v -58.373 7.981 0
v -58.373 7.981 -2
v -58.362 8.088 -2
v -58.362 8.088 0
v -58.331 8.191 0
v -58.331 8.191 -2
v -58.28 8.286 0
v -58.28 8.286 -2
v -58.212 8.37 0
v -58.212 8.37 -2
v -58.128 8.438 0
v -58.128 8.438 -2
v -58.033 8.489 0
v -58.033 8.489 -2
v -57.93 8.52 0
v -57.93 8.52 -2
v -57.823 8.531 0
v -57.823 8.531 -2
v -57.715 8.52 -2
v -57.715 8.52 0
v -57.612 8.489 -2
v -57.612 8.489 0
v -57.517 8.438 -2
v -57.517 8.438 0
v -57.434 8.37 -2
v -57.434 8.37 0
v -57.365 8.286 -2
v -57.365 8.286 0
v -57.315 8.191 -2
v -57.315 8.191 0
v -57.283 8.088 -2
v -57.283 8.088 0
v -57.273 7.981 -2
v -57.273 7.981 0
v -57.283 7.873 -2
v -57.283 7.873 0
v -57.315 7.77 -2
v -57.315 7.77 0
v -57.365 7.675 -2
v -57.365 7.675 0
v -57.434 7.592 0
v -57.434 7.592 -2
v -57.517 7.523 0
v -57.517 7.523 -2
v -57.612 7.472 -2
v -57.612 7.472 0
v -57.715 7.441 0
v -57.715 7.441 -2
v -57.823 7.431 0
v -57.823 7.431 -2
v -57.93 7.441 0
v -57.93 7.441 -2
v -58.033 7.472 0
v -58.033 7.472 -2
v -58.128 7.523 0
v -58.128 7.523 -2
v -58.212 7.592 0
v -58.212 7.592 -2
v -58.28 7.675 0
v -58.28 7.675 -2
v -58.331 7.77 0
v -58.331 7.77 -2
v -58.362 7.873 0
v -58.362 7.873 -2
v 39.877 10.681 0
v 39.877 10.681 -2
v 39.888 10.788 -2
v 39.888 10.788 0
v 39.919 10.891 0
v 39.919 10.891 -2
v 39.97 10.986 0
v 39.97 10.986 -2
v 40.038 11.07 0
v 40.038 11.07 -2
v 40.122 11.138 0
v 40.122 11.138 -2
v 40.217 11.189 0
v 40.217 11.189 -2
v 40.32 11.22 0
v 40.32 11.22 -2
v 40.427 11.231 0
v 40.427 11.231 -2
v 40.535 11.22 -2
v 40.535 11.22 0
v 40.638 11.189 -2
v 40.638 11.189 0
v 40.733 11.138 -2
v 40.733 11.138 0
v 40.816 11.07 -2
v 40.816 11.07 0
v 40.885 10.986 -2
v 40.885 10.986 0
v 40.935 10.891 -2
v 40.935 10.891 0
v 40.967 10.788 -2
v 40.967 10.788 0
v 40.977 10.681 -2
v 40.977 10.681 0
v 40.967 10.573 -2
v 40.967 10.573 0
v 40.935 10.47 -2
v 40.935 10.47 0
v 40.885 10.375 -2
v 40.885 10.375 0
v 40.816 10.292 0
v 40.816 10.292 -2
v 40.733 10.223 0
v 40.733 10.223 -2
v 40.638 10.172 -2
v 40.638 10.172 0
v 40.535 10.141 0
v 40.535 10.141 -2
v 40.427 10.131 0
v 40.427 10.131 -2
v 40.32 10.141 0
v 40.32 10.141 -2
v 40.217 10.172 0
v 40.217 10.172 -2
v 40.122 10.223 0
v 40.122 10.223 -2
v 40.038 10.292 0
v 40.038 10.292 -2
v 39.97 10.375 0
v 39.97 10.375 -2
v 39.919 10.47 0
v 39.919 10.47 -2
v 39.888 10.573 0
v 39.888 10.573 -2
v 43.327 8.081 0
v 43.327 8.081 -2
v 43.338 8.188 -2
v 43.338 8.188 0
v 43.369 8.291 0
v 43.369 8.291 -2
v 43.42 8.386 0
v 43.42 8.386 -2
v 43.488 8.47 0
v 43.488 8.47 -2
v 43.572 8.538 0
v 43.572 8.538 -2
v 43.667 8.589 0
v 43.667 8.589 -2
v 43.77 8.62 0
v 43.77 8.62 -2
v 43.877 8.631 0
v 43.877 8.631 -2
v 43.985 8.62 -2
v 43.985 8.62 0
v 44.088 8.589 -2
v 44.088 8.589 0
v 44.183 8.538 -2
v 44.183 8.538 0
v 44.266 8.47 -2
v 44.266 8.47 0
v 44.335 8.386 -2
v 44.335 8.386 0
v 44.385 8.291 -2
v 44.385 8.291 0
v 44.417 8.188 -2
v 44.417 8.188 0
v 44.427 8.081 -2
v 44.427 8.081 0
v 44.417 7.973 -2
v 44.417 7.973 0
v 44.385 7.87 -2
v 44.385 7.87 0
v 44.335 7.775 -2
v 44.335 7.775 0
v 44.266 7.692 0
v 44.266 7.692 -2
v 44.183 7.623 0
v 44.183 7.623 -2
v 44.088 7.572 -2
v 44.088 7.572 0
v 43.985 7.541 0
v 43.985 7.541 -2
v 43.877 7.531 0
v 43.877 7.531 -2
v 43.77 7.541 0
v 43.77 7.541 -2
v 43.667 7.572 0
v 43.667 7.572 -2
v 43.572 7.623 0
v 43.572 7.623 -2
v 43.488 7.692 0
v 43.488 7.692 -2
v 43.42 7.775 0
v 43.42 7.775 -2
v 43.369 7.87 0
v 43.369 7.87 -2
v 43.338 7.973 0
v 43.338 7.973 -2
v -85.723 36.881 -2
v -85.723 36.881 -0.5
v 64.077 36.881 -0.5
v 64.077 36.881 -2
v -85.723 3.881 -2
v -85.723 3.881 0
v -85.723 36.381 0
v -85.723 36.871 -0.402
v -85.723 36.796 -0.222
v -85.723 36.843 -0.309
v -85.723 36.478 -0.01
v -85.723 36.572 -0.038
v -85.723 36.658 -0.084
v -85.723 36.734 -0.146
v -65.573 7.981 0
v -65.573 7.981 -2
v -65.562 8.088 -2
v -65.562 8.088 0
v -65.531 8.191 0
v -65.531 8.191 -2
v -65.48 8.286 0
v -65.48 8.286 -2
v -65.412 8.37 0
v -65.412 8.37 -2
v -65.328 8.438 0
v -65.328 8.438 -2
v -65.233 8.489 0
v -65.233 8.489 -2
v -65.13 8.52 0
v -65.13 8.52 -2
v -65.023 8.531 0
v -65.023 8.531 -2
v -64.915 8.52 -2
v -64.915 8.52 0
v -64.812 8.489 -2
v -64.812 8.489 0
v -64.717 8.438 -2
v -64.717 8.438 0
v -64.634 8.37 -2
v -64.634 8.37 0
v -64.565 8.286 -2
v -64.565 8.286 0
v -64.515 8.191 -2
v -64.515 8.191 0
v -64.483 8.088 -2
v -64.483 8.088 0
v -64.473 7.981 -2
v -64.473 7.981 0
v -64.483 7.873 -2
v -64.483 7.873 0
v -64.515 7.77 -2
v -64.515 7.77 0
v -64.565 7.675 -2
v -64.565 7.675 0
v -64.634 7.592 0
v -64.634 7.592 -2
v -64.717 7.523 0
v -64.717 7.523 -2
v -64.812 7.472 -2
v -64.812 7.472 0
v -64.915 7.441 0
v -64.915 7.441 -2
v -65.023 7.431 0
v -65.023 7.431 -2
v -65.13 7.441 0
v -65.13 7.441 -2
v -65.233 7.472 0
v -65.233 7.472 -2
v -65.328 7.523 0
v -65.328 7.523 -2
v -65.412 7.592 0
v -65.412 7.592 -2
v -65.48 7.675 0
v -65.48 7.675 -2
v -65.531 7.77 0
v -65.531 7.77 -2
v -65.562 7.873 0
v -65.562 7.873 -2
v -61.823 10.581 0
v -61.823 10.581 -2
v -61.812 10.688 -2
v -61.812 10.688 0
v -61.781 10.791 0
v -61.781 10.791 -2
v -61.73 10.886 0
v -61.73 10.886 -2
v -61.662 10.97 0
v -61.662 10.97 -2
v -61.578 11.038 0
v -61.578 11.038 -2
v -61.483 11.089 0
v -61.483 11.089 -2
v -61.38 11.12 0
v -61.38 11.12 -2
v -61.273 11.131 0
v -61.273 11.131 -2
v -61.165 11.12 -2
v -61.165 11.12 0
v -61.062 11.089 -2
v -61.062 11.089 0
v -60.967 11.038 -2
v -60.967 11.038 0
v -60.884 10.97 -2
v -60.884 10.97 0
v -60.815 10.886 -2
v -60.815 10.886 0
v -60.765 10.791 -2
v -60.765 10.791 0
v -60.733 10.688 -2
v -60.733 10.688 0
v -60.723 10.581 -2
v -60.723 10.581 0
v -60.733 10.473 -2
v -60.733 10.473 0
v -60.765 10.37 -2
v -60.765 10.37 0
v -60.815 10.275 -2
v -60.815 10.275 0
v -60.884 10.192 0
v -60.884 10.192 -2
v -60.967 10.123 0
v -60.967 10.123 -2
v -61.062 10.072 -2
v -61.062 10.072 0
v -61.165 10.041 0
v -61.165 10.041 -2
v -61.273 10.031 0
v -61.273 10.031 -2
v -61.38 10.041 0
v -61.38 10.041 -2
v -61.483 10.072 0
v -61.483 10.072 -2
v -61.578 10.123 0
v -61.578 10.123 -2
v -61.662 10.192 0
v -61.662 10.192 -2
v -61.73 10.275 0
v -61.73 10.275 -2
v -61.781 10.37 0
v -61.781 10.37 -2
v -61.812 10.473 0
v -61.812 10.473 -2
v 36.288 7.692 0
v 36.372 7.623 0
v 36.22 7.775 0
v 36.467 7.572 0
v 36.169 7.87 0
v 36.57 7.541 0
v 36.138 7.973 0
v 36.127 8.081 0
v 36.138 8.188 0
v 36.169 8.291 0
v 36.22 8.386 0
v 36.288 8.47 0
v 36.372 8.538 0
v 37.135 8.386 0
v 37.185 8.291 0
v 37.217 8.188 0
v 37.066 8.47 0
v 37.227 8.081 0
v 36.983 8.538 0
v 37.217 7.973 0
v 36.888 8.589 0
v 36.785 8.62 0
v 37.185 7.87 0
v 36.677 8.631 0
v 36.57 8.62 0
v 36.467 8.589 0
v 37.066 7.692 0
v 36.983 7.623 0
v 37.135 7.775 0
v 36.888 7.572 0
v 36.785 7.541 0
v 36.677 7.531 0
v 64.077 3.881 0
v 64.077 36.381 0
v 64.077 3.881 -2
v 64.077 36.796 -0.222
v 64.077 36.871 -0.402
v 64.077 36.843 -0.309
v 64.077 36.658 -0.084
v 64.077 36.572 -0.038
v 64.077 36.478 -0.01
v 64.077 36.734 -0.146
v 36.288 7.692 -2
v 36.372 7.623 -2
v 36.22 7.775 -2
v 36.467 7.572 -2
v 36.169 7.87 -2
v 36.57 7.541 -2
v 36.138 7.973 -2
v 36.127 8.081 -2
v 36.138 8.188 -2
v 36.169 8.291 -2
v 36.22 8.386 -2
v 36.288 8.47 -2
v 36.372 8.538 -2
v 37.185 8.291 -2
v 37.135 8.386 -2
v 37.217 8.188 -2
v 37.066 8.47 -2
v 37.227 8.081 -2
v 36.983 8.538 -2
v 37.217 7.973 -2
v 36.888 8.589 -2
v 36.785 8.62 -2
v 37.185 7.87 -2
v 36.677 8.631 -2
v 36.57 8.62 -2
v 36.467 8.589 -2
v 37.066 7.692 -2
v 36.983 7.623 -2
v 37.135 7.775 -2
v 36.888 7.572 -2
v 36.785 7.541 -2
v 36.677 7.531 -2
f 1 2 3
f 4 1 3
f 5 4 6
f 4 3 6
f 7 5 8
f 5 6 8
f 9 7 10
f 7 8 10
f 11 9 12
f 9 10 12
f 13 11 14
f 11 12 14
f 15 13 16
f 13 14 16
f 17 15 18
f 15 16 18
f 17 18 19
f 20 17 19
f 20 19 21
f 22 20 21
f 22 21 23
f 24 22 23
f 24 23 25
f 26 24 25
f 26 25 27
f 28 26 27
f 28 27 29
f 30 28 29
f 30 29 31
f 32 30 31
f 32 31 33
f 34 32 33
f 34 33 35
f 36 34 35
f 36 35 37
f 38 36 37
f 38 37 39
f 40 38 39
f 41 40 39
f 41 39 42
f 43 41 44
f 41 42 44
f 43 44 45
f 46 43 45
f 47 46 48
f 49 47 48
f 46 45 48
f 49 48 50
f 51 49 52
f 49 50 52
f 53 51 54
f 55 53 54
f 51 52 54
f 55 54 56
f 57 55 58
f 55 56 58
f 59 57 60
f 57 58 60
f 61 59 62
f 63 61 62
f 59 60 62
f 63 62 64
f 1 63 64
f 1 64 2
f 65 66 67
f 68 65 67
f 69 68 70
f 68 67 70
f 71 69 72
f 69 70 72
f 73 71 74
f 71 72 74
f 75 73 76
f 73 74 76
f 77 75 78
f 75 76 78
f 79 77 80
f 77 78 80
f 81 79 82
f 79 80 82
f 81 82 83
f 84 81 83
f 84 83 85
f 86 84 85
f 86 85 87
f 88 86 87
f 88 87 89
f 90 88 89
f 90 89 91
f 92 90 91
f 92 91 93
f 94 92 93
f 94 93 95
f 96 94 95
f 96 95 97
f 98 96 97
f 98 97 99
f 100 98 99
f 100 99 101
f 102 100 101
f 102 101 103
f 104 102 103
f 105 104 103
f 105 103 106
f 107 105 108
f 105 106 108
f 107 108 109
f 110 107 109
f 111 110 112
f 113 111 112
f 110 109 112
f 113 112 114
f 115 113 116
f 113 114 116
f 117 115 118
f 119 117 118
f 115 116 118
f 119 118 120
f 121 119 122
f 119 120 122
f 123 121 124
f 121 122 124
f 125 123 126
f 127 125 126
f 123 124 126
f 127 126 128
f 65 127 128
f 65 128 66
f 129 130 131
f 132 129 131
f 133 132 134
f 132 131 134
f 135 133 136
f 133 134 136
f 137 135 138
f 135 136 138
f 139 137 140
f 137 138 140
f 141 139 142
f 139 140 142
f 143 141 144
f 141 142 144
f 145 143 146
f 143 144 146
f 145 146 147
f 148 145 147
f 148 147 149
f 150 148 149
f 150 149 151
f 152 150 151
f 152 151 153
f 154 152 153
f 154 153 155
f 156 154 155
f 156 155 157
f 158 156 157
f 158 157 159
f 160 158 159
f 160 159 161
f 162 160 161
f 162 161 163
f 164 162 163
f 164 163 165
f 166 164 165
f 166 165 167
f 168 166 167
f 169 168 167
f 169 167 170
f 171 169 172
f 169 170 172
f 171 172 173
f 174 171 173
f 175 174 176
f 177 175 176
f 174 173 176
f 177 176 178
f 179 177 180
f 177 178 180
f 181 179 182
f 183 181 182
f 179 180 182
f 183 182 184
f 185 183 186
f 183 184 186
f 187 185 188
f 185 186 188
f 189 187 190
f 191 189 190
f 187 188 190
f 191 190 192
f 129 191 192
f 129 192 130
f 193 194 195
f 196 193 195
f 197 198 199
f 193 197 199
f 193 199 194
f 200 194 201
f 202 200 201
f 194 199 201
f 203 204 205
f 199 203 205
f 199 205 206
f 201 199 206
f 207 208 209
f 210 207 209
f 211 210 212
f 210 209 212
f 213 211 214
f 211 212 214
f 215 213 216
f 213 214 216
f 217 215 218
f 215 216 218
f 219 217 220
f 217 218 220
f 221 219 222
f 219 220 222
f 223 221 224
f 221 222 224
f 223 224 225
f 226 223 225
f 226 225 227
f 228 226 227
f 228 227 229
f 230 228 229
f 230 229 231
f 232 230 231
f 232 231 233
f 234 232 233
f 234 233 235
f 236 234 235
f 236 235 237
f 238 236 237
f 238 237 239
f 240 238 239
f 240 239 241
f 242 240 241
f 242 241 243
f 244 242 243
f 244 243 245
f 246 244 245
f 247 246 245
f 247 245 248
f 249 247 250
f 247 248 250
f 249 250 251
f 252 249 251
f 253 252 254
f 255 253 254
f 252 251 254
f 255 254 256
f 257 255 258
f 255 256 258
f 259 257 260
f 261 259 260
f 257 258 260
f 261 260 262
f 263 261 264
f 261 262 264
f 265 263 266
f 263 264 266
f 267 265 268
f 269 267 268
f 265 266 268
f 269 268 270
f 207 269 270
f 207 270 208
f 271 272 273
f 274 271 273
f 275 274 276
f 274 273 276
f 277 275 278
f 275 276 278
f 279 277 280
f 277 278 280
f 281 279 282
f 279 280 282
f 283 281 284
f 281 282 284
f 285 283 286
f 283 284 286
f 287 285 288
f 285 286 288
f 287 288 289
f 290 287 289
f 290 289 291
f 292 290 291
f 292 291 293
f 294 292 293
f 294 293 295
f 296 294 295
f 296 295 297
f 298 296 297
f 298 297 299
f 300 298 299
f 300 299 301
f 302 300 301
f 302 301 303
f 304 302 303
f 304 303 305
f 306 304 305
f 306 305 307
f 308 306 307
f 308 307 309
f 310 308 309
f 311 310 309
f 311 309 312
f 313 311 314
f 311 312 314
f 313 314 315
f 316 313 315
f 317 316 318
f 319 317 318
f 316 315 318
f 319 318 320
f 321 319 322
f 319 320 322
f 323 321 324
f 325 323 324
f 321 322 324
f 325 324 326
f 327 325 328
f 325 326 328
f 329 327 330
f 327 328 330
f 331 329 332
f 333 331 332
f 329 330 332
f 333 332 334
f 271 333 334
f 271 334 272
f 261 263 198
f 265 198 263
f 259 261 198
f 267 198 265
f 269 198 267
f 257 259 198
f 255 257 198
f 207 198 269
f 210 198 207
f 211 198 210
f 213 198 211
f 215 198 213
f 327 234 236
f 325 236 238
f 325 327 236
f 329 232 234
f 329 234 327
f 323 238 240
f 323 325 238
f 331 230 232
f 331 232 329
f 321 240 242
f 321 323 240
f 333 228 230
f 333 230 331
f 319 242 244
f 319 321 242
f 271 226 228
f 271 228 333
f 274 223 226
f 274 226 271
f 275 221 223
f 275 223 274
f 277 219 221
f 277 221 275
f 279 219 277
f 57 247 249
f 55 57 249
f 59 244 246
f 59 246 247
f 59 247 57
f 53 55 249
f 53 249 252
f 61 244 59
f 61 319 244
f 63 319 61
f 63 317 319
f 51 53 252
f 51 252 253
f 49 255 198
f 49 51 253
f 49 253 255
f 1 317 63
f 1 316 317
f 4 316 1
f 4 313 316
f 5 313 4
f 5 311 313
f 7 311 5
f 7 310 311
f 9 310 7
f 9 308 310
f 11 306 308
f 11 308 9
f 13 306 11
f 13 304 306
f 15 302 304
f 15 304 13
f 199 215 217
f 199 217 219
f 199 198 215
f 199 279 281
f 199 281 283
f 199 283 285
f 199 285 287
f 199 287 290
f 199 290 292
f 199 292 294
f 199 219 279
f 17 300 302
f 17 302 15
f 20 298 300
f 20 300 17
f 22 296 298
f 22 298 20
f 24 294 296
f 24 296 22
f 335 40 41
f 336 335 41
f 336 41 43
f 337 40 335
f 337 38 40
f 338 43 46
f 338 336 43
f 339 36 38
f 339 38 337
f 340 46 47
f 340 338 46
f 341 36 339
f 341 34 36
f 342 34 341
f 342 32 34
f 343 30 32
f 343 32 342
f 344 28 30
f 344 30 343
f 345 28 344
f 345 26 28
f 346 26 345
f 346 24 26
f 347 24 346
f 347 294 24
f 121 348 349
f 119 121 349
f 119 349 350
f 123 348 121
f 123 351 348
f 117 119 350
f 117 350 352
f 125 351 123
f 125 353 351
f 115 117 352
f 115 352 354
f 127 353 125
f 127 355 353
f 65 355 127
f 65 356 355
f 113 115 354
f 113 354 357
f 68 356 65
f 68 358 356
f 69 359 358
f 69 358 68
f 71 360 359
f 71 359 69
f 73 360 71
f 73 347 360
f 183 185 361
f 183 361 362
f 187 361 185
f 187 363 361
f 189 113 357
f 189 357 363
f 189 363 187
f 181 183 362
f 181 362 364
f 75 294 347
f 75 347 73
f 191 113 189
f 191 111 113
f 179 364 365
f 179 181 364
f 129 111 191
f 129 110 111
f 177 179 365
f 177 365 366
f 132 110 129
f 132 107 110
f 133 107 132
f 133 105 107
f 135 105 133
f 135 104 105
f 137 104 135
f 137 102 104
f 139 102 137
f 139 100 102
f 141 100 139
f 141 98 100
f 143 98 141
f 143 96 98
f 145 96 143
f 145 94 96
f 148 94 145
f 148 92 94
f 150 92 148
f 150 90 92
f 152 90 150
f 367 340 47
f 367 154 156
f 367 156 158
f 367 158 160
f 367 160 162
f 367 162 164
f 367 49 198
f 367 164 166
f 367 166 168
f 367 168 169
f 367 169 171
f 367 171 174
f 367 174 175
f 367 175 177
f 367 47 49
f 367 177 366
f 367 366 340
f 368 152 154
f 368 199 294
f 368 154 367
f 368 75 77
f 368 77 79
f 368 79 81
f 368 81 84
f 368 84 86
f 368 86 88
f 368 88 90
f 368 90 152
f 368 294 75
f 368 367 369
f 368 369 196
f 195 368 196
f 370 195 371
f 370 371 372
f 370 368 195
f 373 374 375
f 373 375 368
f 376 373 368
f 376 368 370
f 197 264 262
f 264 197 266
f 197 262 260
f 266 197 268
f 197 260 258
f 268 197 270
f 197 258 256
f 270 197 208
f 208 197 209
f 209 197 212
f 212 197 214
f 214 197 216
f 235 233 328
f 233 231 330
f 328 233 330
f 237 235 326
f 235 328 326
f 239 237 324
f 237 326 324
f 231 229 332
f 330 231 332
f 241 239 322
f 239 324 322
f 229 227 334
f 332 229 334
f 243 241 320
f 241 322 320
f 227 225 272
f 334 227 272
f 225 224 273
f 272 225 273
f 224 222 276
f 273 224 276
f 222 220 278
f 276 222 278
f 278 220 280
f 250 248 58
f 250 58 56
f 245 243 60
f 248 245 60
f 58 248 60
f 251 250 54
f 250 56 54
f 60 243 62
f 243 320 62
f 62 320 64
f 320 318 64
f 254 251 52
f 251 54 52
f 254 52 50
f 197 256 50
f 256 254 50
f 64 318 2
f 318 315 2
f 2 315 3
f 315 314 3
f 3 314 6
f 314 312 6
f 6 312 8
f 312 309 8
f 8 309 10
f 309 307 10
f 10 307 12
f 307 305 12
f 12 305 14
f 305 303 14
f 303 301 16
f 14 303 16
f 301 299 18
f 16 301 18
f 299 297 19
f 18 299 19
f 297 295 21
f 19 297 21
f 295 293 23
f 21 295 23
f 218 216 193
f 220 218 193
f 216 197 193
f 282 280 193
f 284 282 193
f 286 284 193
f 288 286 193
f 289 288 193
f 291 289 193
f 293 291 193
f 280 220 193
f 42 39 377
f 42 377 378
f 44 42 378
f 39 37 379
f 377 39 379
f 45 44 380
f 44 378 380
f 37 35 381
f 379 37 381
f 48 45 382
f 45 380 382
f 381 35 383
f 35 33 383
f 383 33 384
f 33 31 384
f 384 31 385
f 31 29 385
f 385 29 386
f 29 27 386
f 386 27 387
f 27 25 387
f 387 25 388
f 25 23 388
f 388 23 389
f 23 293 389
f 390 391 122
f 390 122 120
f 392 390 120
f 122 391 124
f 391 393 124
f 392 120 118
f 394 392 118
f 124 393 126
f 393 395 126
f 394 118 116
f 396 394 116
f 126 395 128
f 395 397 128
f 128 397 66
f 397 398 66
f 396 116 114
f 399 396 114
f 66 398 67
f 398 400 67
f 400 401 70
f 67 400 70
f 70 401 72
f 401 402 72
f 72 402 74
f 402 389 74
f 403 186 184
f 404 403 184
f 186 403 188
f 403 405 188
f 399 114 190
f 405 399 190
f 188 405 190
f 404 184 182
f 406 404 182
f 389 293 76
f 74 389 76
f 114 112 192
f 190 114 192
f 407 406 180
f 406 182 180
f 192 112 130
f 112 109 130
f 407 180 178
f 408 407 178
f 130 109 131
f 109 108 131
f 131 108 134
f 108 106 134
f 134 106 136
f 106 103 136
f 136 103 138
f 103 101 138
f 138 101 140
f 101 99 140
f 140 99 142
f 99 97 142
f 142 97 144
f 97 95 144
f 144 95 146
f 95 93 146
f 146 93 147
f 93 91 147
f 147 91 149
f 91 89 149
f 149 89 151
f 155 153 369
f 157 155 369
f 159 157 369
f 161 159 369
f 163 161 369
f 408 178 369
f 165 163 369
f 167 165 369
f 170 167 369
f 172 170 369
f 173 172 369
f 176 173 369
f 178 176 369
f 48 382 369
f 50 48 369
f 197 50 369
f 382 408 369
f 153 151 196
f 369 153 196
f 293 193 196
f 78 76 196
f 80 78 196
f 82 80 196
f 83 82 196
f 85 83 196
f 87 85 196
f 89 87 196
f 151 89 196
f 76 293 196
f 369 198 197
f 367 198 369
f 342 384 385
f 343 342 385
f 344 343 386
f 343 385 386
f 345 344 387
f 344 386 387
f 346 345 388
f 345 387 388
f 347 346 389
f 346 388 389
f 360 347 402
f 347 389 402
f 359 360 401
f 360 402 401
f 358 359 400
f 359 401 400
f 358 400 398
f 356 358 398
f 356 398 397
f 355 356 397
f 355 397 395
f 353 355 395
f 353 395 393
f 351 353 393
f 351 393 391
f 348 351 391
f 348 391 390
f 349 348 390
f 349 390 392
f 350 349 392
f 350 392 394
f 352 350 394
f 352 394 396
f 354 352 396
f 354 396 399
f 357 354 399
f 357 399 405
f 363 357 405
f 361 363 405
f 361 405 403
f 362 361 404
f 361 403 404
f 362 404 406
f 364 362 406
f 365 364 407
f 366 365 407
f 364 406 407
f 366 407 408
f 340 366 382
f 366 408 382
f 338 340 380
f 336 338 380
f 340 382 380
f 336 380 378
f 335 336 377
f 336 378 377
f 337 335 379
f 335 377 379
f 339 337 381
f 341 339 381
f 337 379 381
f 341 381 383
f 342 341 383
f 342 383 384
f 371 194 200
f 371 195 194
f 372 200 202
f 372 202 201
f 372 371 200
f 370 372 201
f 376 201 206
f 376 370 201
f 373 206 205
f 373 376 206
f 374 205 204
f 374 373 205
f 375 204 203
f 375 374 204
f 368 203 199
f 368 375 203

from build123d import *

# Parameters (mm, degrees)
F0_W     = 149.8
F0_H     = 33
F1_DEPTH = 2
F2_D     = 1.1
F3_R     = 0.5


with BuildPart() as f1:
    # F0 (on Top) → F1 (new body)
    with BuildSketch(Plane.XY):
        with Locations((-10.822785, 20.380608)):
            Rectangle(F0_W, F0_H)
    extrude(amount=-F1_DEPTH)

    # F2 (through all)
    with Locations(Plane.XY):
        with Locations((-65.022785, 7.980608), (-61.272785, 10.580608), (-57.822785, 7.980608), (36.677215, 8.080608), (40.427215, 10.680608), (43.877215, 8.080608)):
            Hole(F2_D / 2)

    # F3
    f3_edges = [f1.edges().sort_by_distance(p)[0] for p in [
        (-10.822785, 36.880608, 0),
    ]]
    fillet(f3_edges, radius=F3_R)


solid = f1.part
